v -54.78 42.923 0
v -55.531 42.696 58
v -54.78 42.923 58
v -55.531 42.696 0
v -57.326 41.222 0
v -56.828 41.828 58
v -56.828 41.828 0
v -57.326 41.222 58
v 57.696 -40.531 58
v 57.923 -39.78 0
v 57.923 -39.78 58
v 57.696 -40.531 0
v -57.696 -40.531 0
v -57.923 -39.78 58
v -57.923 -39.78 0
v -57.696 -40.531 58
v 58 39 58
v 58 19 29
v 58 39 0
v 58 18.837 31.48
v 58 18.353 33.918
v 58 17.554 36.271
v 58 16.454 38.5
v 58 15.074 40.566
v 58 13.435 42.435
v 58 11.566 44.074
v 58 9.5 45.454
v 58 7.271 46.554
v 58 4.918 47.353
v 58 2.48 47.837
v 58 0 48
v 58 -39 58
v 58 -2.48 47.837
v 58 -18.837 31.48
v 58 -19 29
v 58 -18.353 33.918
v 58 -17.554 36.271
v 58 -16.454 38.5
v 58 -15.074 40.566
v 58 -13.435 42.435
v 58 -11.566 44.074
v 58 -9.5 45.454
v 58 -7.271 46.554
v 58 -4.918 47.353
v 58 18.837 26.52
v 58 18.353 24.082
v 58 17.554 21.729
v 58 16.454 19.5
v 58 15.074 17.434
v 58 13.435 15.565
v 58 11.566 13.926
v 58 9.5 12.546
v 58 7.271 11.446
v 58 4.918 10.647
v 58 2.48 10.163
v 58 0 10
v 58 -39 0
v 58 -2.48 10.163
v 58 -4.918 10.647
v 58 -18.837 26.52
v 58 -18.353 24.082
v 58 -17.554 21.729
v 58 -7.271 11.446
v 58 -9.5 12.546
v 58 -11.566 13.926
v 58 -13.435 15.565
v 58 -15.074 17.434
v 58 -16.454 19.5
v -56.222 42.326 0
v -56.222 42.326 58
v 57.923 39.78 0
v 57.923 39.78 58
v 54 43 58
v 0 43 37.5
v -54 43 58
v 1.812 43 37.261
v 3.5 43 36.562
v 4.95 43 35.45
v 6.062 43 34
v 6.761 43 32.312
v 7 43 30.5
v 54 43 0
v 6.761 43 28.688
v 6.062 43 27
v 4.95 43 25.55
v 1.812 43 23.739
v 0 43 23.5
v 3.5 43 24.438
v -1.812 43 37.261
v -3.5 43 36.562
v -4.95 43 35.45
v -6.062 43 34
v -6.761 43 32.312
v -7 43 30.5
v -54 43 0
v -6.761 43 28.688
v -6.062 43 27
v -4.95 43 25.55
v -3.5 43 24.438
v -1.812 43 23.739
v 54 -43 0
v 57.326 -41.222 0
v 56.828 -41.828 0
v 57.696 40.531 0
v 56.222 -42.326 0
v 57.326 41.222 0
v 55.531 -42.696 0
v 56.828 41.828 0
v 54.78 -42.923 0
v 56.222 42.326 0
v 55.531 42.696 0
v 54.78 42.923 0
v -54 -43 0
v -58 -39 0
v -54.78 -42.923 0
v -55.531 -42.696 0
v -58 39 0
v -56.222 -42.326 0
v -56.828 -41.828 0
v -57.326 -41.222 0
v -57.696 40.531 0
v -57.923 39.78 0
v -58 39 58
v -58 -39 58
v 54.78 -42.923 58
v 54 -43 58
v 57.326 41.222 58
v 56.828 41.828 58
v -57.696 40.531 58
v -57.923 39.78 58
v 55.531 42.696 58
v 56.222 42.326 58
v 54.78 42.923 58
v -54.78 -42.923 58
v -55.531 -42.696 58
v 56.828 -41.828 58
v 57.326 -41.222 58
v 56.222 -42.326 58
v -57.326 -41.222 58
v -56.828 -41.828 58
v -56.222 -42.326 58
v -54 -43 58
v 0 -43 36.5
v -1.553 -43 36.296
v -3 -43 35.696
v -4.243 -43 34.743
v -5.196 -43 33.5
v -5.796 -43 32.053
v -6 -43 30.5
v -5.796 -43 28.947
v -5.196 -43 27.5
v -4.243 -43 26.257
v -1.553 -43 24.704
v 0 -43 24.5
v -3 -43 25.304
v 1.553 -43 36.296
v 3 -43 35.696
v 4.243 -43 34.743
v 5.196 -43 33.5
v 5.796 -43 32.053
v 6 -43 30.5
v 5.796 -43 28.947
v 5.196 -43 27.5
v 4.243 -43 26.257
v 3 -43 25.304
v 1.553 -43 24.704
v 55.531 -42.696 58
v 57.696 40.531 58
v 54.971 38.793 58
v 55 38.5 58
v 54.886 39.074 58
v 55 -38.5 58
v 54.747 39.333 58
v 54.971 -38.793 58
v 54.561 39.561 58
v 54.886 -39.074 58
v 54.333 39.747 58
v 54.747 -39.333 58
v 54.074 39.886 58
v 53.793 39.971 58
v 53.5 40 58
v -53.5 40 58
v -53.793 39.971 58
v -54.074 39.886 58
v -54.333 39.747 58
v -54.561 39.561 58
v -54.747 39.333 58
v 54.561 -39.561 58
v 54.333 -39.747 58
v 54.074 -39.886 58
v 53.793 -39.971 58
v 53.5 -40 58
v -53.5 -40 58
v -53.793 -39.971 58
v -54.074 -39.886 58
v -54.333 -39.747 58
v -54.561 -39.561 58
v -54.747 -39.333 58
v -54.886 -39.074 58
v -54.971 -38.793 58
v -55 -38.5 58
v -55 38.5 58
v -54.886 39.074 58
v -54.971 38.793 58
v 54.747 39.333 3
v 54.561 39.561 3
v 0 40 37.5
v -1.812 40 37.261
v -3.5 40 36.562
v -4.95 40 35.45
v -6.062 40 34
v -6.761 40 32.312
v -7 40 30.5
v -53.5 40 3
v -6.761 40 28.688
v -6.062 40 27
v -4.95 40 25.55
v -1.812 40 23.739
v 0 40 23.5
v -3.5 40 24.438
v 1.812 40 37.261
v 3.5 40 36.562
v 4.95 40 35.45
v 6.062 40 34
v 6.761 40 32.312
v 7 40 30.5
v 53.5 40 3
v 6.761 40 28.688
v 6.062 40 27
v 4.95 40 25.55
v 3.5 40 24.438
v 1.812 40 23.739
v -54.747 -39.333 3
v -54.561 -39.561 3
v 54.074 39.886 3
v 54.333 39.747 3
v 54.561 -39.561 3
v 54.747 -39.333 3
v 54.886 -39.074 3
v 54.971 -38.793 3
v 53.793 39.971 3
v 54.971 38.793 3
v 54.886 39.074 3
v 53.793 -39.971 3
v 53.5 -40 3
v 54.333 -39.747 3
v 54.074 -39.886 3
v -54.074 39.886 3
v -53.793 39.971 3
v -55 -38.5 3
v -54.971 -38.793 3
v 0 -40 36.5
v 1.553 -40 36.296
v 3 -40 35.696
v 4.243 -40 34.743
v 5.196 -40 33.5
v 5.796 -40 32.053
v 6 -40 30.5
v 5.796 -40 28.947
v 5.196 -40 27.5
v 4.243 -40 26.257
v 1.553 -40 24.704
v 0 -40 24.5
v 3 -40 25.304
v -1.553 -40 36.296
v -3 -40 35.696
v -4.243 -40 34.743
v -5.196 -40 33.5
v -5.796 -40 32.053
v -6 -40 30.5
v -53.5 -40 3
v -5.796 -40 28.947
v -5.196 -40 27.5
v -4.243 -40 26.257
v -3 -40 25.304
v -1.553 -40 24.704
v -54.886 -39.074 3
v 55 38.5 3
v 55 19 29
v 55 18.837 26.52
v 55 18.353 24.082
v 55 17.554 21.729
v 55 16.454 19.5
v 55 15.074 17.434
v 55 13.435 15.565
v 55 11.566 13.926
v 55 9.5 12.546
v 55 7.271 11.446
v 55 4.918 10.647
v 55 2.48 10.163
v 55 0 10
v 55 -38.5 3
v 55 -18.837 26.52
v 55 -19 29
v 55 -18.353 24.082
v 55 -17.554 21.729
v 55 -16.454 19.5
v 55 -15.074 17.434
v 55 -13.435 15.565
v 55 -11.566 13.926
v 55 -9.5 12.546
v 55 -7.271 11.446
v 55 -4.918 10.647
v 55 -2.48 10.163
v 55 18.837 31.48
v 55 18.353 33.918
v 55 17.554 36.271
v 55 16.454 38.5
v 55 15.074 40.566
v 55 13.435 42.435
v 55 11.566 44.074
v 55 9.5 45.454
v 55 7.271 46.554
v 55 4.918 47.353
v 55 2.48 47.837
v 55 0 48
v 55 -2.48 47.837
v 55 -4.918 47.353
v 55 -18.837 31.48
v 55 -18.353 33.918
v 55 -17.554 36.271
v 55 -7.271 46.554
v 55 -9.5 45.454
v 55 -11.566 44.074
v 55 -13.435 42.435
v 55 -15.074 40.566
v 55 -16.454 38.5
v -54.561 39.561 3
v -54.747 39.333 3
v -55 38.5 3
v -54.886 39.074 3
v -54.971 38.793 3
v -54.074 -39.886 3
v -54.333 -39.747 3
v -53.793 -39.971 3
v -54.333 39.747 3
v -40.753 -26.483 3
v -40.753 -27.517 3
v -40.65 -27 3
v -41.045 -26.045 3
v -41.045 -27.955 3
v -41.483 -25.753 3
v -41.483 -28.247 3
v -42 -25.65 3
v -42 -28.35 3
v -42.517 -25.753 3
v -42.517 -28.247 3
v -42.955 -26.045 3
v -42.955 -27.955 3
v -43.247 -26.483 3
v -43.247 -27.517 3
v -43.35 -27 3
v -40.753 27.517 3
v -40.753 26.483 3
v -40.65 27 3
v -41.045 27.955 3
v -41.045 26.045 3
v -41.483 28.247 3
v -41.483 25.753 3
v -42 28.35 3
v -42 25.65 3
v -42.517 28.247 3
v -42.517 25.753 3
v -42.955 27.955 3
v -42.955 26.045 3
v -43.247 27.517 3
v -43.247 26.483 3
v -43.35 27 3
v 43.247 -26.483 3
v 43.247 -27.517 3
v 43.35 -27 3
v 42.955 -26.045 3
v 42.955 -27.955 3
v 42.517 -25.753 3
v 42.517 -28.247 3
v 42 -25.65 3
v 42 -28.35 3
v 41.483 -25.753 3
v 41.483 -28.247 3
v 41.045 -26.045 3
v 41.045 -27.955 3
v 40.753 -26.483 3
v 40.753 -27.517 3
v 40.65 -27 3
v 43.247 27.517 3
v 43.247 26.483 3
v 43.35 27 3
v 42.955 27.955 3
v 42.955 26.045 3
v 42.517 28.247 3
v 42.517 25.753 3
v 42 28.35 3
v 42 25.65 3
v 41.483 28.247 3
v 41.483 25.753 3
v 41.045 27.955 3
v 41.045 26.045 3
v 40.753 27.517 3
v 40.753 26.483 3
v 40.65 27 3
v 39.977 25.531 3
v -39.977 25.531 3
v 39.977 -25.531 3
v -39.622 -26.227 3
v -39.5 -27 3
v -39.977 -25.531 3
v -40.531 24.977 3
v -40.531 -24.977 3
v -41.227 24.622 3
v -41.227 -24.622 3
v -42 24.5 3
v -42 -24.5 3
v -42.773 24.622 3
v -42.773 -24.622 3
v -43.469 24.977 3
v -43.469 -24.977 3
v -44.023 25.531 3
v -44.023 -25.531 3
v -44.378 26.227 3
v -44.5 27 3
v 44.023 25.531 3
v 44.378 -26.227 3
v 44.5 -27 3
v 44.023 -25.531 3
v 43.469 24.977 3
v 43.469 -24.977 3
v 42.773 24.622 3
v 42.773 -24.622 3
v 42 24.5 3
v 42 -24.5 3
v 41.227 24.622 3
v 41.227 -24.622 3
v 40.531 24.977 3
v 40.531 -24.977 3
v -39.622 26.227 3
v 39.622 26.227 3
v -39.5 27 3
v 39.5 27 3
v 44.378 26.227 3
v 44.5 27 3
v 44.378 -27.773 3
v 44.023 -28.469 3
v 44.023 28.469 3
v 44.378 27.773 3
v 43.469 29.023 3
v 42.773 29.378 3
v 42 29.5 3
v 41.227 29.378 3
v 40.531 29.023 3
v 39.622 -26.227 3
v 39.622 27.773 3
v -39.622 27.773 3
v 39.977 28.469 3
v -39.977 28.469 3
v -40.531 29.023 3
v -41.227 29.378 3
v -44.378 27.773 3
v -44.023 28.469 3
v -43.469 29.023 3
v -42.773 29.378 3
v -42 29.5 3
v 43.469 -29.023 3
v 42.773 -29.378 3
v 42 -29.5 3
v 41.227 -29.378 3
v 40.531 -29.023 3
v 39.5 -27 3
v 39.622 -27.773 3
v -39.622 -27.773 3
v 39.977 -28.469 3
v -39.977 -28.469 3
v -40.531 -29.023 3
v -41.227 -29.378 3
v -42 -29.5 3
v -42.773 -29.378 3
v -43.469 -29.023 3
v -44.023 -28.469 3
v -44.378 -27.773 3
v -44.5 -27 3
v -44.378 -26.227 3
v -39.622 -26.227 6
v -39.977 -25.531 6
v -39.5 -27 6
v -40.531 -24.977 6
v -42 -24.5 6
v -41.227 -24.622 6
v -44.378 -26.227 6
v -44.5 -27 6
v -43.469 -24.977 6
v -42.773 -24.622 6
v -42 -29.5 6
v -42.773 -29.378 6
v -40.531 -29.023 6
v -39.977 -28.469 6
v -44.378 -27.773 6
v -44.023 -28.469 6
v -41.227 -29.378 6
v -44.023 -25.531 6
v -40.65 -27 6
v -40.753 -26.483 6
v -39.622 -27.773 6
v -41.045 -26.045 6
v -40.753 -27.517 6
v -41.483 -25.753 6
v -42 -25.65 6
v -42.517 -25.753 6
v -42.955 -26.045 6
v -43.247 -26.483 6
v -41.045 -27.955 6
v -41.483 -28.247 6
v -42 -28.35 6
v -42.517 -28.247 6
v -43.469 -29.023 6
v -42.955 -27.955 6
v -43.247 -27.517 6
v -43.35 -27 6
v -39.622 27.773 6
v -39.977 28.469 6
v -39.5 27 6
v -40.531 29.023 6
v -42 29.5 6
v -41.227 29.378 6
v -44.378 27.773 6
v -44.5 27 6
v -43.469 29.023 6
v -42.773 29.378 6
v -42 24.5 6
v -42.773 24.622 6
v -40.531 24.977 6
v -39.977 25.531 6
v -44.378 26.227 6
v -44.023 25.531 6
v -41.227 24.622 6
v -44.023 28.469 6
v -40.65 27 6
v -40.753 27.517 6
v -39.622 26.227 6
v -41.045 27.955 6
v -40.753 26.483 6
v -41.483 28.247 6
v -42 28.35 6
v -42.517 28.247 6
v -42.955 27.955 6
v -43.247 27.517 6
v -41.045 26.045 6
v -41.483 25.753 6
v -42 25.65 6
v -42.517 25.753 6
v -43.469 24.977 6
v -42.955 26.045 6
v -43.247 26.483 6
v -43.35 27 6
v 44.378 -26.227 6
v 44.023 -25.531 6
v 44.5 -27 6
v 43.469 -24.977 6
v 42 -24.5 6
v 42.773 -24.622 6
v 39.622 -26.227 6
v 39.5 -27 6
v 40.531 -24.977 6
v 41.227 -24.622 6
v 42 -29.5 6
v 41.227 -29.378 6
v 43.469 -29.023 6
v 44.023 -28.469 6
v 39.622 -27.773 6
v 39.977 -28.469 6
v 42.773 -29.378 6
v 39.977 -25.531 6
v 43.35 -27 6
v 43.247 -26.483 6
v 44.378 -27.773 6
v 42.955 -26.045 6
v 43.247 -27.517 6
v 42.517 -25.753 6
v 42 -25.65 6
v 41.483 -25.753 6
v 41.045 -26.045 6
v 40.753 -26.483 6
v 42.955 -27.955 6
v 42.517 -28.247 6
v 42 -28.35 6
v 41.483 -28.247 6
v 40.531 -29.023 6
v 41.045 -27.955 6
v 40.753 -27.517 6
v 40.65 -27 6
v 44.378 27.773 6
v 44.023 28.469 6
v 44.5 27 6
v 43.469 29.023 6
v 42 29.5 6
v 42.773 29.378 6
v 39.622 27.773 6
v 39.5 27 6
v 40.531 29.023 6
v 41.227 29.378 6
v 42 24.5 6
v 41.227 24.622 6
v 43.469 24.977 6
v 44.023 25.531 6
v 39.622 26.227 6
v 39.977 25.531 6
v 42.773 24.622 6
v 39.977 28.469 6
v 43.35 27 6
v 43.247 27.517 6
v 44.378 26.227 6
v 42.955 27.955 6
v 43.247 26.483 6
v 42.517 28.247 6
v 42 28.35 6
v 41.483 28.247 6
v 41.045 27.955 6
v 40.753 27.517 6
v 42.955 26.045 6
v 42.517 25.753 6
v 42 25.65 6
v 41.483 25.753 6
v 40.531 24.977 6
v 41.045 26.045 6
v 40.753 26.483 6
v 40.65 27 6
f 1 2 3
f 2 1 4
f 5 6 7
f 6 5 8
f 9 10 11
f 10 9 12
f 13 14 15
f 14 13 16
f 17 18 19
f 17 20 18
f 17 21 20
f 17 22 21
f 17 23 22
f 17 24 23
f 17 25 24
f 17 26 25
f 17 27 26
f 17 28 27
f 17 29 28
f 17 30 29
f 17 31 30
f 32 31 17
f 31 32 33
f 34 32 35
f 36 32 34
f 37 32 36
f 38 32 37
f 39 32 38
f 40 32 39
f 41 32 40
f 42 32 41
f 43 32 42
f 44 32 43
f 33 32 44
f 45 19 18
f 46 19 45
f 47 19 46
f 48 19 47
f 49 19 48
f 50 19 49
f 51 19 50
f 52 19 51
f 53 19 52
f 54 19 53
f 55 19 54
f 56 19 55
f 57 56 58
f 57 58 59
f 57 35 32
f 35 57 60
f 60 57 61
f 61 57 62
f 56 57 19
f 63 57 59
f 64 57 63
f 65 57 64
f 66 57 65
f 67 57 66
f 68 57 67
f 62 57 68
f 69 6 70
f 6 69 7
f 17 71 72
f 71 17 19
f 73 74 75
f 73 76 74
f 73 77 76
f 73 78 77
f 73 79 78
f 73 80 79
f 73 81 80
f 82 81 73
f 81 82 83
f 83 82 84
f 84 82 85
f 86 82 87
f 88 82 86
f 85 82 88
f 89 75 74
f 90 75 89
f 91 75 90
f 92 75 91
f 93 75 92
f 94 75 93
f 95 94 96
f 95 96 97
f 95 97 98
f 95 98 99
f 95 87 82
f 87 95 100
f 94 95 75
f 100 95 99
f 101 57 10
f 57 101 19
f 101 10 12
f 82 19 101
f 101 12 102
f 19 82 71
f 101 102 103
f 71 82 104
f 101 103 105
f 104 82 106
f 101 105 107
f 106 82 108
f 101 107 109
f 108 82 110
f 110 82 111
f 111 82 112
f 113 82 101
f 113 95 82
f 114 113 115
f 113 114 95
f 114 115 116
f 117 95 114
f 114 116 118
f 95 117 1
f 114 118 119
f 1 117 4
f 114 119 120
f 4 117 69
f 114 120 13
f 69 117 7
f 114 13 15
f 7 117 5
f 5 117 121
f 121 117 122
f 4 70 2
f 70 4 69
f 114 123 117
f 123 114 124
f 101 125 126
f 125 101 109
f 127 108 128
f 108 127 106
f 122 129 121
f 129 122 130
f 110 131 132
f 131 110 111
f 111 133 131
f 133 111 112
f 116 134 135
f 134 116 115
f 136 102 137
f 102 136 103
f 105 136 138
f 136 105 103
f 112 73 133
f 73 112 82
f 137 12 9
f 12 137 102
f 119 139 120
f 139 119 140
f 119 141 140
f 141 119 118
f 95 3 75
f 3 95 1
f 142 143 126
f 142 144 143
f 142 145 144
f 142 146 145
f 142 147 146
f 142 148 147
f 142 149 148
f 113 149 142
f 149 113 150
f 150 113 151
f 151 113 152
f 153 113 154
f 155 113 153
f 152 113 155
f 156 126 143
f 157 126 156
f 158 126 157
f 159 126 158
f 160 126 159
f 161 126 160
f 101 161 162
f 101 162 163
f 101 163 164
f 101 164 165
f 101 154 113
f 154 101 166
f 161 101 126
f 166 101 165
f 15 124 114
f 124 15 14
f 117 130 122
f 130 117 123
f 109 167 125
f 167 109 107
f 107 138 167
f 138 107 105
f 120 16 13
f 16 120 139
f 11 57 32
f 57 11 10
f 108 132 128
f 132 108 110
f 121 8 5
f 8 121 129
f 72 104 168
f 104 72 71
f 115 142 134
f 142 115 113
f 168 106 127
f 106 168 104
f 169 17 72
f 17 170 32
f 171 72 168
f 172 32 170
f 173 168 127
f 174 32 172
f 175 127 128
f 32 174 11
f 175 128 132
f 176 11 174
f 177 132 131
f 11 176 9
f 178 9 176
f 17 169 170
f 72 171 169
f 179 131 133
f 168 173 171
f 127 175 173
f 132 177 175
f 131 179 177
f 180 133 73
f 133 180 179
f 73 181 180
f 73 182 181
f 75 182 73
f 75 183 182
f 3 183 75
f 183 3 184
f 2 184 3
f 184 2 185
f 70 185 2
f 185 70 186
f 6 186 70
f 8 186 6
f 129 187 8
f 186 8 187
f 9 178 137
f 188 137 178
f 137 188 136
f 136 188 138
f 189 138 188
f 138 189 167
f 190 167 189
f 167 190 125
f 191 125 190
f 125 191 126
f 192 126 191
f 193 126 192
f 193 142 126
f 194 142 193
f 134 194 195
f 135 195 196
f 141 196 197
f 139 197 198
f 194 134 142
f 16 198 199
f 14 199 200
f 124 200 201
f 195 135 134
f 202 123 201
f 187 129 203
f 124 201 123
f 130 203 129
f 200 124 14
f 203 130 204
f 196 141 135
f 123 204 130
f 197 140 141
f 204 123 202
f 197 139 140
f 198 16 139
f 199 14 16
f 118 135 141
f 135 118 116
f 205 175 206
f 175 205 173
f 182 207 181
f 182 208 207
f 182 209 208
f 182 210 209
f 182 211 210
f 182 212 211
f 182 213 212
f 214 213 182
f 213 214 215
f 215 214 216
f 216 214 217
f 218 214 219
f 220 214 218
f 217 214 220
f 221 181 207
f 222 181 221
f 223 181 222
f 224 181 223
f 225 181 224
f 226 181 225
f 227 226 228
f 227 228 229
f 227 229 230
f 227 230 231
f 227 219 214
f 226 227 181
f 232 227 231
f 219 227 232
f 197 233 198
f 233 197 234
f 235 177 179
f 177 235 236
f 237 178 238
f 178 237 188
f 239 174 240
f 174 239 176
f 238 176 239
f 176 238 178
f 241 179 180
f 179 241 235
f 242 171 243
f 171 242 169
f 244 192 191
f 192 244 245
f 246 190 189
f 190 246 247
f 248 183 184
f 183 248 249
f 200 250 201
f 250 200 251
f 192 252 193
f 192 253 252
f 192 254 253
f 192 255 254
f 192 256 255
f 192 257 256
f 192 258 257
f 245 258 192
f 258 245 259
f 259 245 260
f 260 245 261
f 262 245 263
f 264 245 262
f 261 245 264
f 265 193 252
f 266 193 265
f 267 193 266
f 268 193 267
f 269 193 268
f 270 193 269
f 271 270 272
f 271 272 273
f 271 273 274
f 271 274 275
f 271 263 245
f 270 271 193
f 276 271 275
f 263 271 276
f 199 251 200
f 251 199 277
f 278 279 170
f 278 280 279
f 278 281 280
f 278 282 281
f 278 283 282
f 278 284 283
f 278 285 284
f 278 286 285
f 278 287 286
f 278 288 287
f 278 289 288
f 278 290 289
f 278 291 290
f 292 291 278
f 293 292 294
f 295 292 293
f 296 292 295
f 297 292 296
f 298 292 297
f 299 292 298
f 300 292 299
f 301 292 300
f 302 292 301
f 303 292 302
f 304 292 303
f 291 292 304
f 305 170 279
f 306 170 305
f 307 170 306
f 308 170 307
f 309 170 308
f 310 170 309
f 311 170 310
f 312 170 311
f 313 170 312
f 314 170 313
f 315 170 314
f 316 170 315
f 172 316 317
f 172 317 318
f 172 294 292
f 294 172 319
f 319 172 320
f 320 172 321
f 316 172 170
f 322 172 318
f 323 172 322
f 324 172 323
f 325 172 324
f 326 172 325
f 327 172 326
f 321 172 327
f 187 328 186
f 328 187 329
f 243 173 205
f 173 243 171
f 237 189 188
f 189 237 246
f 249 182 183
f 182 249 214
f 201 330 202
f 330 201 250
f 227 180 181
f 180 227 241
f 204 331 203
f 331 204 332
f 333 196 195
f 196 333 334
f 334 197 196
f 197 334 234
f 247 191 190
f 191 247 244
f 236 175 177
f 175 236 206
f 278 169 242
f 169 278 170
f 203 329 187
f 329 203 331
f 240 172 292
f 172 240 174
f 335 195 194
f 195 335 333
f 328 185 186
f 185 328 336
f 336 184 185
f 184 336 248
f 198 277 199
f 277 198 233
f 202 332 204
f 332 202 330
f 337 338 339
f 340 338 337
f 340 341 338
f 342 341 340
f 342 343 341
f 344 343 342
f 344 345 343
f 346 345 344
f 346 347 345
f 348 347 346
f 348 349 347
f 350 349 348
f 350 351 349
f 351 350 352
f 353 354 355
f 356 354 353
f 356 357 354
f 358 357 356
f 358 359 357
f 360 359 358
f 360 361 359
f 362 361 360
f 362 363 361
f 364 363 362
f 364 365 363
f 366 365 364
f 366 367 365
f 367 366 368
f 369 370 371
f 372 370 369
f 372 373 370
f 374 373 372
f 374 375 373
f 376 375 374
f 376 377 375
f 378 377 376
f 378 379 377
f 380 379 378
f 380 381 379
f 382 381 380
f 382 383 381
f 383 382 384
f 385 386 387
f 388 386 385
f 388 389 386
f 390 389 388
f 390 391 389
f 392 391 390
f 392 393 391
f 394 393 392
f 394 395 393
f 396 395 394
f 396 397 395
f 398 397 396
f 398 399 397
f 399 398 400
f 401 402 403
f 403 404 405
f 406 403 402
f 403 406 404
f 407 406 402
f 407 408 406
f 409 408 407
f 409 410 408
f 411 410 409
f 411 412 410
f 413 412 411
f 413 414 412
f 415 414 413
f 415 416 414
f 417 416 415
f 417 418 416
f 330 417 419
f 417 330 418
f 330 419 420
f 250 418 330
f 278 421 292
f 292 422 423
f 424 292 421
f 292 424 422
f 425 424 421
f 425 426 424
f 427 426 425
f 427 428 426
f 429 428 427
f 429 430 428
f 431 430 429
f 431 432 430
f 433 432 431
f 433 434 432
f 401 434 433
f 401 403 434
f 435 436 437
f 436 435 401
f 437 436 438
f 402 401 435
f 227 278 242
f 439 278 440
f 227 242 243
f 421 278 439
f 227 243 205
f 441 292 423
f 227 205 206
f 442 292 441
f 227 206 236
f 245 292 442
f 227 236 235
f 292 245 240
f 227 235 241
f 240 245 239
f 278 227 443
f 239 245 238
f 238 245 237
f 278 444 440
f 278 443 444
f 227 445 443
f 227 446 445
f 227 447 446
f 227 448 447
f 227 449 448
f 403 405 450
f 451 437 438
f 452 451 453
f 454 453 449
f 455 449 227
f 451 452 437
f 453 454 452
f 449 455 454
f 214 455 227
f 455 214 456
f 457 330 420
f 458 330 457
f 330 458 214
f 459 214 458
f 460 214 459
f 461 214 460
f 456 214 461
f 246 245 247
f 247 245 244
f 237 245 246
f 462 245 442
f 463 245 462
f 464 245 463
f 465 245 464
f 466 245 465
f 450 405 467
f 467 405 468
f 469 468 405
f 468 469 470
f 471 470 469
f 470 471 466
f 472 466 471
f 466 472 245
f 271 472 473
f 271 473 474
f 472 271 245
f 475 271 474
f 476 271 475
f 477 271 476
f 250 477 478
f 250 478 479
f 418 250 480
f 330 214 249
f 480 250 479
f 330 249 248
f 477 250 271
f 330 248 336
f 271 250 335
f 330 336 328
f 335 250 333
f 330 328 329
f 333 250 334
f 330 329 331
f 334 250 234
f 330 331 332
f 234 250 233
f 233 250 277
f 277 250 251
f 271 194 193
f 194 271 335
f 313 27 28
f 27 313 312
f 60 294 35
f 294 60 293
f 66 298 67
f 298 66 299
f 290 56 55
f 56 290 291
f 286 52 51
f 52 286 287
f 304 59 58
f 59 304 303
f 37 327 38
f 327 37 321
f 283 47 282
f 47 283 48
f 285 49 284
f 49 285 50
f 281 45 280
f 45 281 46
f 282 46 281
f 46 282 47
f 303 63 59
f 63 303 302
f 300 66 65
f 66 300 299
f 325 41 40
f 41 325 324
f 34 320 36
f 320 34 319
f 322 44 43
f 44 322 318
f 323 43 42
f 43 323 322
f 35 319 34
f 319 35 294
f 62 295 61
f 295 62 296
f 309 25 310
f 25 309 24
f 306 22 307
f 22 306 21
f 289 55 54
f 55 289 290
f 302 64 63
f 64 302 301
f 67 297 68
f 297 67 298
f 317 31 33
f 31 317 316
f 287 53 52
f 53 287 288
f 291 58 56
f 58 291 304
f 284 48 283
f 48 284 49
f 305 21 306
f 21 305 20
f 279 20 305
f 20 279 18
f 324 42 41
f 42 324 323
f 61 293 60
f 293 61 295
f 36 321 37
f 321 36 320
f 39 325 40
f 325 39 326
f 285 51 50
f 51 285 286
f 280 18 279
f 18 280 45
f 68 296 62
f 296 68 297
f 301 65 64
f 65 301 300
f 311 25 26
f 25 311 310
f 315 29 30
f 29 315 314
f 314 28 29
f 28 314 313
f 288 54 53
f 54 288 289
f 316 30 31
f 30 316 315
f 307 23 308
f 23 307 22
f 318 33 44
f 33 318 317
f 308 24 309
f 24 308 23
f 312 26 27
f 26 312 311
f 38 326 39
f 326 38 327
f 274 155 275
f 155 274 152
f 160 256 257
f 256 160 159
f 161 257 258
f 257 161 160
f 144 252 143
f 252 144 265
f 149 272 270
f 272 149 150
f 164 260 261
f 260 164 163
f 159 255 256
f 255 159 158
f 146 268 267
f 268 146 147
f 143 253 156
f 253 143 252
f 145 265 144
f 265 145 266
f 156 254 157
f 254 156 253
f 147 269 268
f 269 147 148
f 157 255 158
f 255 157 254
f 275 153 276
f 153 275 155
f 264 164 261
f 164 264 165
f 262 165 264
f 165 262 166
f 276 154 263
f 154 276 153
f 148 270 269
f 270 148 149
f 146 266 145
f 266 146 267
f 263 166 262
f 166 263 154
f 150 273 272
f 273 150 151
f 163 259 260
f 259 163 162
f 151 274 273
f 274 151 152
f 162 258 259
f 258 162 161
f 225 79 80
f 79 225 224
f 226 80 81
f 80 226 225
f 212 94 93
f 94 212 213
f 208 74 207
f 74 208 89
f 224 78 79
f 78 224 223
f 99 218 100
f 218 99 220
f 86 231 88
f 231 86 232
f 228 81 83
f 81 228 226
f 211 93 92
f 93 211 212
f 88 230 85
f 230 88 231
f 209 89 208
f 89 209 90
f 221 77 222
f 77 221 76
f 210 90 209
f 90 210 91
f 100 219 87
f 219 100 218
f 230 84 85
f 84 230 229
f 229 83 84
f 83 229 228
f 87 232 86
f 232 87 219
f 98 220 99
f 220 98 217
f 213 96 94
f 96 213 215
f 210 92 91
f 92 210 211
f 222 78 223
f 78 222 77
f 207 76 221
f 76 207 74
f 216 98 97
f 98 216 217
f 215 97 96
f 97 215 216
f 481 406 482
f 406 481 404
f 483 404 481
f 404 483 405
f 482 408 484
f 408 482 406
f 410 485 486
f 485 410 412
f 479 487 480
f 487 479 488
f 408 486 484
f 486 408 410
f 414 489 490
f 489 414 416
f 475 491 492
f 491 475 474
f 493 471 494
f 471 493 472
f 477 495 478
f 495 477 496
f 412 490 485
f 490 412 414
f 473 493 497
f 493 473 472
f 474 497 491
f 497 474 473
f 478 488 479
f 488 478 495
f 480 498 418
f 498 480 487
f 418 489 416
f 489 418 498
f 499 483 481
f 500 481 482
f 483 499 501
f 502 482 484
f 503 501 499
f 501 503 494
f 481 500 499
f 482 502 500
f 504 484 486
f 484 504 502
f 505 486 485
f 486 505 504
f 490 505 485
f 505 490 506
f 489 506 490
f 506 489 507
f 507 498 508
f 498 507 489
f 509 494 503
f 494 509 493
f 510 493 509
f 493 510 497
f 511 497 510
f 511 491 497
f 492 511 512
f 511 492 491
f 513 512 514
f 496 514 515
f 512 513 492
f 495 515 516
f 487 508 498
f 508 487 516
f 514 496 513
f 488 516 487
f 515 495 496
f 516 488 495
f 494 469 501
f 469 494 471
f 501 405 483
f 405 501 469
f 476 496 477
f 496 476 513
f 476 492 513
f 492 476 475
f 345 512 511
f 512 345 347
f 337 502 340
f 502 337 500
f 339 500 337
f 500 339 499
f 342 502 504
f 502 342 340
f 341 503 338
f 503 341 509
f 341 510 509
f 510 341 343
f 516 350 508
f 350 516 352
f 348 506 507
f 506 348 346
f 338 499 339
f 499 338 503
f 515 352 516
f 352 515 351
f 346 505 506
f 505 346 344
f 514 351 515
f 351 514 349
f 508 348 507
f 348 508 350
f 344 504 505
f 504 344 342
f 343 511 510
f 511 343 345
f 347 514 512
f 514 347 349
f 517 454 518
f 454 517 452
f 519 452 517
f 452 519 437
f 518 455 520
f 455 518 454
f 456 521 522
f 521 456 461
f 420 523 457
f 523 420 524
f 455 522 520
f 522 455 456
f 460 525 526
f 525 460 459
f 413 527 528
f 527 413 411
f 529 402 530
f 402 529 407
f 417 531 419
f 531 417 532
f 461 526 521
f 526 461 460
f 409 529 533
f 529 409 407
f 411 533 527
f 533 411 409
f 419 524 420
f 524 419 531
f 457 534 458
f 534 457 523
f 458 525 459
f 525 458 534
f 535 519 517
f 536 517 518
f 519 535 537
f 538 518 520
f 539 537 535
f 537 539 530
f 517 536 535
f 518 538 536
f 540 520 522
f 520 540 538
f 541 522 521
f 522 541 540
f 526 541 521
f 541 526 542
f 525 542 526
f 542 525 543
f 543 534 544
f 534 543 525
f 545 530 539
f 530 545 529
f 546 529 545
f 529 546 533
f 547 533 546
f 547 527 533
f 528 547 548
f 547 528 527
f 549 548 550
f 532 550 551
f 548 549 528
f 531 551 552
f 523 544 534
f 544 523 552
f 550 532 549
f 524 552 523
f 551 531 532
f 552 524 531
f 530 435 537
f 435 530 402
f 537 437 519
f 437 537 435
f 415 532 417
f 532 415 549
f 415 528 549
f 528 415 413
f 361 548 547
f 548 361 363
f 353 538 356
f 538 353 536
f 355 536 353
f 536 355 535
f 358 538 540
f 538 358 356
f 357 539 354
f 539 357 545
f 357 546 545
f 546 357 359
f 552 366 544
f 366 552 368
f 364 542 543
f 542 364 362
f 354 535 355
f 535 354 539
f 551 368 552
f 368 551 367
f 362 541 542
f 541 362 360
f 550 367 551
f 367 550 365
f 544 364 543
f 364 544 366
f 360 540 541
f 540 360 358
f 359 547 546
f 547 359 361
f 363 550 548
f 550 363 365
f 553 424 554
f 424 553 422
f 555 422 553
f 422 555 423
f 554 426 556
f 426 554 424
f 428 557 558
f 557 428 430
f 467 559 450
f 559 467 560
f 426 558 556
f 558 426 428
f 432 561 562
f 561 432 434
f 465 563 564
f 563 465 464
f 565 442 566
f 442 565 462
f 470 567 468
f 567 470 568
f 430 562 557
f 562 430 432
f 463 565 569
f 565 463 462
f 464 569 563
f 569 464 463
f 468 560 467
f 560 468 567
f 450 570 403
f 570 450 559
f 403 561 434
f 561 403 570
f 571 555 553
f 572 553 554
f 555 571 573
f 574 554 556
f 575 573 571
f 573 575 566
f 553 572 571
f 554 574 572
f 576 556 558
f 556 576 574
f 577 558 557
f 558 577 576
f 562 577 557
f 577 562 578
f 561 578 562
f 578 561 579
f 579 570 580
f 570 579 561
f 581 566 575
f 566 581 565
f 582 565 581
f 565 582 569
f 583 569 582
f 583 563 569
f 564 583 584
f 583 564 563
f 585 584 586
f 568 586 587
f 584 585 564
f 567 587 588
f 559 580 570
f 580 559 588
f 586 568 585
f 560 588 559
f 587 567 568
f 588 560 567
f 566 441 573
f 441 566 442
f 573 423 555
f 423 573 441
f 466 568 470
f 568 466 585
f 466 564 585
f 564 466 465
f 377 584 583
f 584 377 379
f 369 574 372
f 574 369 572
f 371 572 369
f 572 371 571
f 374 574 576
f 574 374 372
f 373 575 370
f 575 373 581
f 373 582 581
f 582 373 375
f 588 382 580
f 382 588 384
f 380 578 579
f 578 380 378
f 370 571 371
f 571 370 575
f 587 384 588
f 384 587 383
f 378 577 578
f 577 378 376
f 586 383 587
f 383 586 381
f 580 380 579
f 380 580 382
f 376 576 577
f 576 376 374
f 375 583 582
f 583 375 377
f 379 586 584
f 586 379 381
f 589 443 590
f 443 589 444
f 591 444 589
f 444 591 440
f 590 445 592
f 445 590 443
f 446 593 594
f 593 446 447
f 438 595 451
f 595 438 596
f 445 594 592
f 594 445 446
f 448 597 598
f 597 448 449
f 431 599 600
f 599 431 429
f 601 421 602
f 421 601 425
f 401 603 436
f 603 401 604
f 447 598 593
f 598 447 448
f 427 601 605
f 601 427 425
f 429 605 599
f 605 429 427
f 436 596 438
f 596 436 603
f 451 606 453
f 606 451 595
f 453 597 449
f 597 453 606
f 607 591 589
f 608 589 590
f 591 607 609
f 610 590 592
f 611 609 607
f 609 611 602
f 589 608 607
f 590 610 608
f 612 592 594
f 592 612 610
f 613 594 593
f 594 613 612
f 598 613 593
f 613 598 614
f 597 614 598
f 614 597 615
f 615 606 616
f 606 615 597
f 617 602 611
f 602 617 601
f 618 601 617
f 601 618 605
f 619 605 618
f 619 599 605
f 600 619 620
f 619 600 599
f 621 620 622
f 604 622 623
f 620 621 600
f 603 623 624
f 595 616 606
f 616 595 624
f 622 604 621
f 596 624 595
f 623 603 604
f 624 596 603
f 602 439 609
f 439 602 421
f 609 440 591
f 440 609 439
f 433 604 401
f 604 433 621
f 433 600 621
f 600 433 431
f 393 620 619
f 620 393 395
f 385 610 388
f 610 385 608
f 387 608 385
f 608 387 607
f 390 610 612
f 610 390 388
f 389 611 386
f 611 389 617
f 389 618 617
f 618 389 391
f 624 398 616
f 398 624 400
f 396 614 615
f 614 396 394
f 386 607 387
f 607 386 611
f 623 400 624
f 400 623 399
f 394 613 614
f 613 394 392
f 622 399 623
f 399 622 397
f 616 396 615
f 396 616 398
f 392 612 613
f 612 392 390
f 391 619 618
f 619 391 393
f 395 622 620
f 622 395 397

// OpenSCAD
/*
 * malcolm_field_enclosure.scad
 * IP65 weatherproof field enclosure for Malcolm GCS comms node
 * (PocketBeagle 2 Industrial + Cape-B-2 + XCVR-49MHZ-2 stack)
 *
 * Author:  Steve Griffing, PE(CSE), CISSP-ISSEP, CPP
 * License: CC BY 4.0 — creativecommons.org/licenses/by/4.0
 * Revision: R (2026-06-11)
 *
 * Description:
 *   Two-part (lid + body) enclosure for Malcolm's comms node.  The interior
 *   fits the PB2-I + Cape-B-2 + XCVR-49MHZ-2 stack on standoffs, a 40 mm
 *   cooling fan, and cable gland locations for RF, USB, power, and servo
 *   feedthroughs.  The lid is retained by M3 screws with a perimeter EPDM
 *   gasket for IP65 ingress protection.
 *
 *   NOTE: This design uses standard off-the-shelf components where possible.
 *   If a commercial Hammond 1590XX or similar IP65 aluminum enclosure fits the
 *   stack, prefer that over a printed enclosure to save weight and print time.
 *   See malcolm_power_budget.md and malcolm_wiring.md for stack dimensions.
 *
 * Stack envelope (Cape-B-2 + PB2-I + XCVR-49MHZ-2):
 *   Footprint: 90 mm × 60 mm
 *   Height:    29 mm (Cape-B-2 PCB 1.6 mm + M2.5×6 standoffs + PB2-I 6 mm board
 *              + M2.5×20 inter-cape standoffs + XCVR 8 mm) ≈ 42 mm total stack
 *   Board clearance below: 3 mm standoff feet
 *   Board clearance above: 8 mm lid clearance
 *   Total interior height needed: 3 + 42 + 8 = 53 mm
 *
 * Mesh verification: run after every geometry change.
 *   openscad -o malcolm_field_enclosure.stl malcolm_field_enclosure.scad
 *   python3 tools/validate_stls.py
 */

/* ---------------------------------------------------------------------------
 * Render mode: 0 = body only, 1 = lid only, 2 = exploded assembly view
 * ---------------------------------------------------------------------------*/
RENDER_MODE = 0;

/* ---------------------------------------------------------------------------
 * Interior dimensions (must fit stack + fan + cable routing)
 * ---------------------------------------------------------------------------*/
INT_W   = 110;      /* Interior width  (X) mm — 90mm stack + 10mm margin each side */
INT_D   = 80;       /* Interior depth  (Y) mm — 60mm stack + 10mm margin each side */
INT_H   = 55;       /* Interior height (Z) mm — see stack height calculation above  */

/* ---------------------------------------------------------------------------
 * Wall and lid geometry
 * ---------------------------------------------------------------------------*/
WALL_T      = 3.0;  /* Wall thickness mm — 3mm PETG adequate for weather seal */
LID_T       = 3.0;  /* Lid panel thickness mm                                  */
GASKET_W    = 4.0;  /* EPDM gasket groove width mm                             */
GASKET_D    = 2.0;  /* EPDM gasket groove depth mm (gasket 3mm dia compresses) */
CORNER_R    = 4.0;  /* Exterior corner radius mm                               */
SCREW_PITCH = 40.0; /* Lid screw pattern — one M3 screw every 40mm along rim   */

/* ---------------------------------------------------------------------------
 * Fan cutout (40 mm axial cooling fan in body wall)
 * ---------------------------------------------------------------------------*/
FAN_SIZE    = 40.0; /* Fan frame size mm (standard 40×40mm fan)                */
FAN_HOLE_D  = 38.0; /* Fan airflow opening diameter mm                         */
FAN_SCREW   = 32.0; /* Fan mounting screw hole pitch mm (32mm for 40mm fan)    */
FAN_SCREW_D = 3.5;  /* Fan mounting screw clearance diameter mm (M3)           */

/* ---------------------------------------------------------------------------
 * Cable gland locations (centred on body walls)
 * Z-position = gland centre height from floor (inside face)
 * ---------------------------------------------------------------------------*/
USB_GLAND_Z     = INT_H / 2;   /* USB-C gland on front wall — mid-height      */
PWR_GLAND_Z     = INT_H / 2;   /* Power XT30 gland on rear wall               */
RF_GLAND_Z      = INT_H * 0.7; /* 5× SMA glands on right wall — upper zone    */
SERVO_GLAND_Z   = INT_H * 0.3; /* Multi-pin servo/I2C connector on left wall  */

/* ---------------------------------------------------------------------------
 * Standoff pattern for Cape-B-2 PCB (90×60mm, M2.5 holes)
 * Origin at floor centre of interior.
 * ---------------------------------------------------------------------------*/
STAND_H     = 3.0;  /* Standoff height off floor mm                           */
STAND_OD    = 5.0;  /* Standoff outer diameter mm                             */
STAND_ID    = 2.7;  /* M2.5 clearance bore mm                                 */
PCB_W       = 90.0; /* Cape-B-2 PCB width mm                                  */
PCB_D       = 60.0; /* Cape-B-2 PCB depth mm                                  */
PCB_MOUNT_X = PCB_W / 2 - 3;   /* PCB mounting hole inset from edge mm        */
PCB_MOUNT_Y = PCB_D / 2 - 3;

/* ============================================================================
 * Derived dimensions
 * ============================================================================*/
EXT_W = INT_W + 2 * WALL_T;    /* Total exterior width  */
EXT_D = INT_D + 2 * WALL_T;    /* Total exterior depth  */
EXT_H = INT_H + WALL_T;        /* Body height (no lid)  */

module rounded_box(w, d, h, r) {
    /*
     * Solid rounded-corner cuboid for exterior shell subtraction.
     * w = width (X), d = depth (Y), h = height (Z), r = corner radius.
     */
    hull() {
        for (xi = [-1, 1]) {
            for (yi = [-1, 1]) {
                translate([xi * (w / 2 - r), yi * (d / 2 - r), 0]) {
                    cylinder(r = r, h = h, $fn = 32);
                }
            }
        }
    }
}

module pcb_standoff(x, y) {
    /*
     * Single M2.5 boss standoff at (x, y) from PCB origin.
     * Standoff is a cylinder with a central clearance bore.
     */
    translate([x, y, 0]) {
        difference() {
            cylinder(d = STAND_OD, h = STAND_H, $fn = 20);
            cylinder(d = STAND_ID, h = STAND_H + 0.1, $fn = 16);
        }
    }
}

module enclosure_body() {
    /*
     * Body (open-top box) with PCB standoffs, fan cutout, and cable gland bosses.
     * Lid seats on the top flange; EPDM gasket groove runs around the perimeter.
     */
    difference() {
        /* --- Exterior solid --- */
        rounded_box(EXT_W, EXT_D, EXT_H, CORNER_R);

        /* --- Interior pocket --- */
        translate([0, 0, WALL_T]) {
            rounded_box(INT_W, INT_D, EXT_H, CORNER_R - WALL_T + 0.5);
        }

        /* --- Fan cutout in +X wall (right side) --- */
        translate([EXT_W / 2, 0, EXT_H / 2]) {
            rotate([0, 90, 0]) {
                cylinder(d = FAN_HOLE_D, h = WALL_T * 2 + 1, center = true, $fn = 48);
            }
        }

        /* --- USB-C gland cutout in -Y wall (front) — placeholder 12mm dia --- */
        translate([0, -EXT_D / 2, USB_GLAND_Z + WALL_T]) {
            rotate([90, 0, 0]) {
                cylinder(d = 12, h = WALL_T * 2 + 1, center = true, $fn = 24);
            }
        }

        /* --- Power gland cutout in +Y wall (rear) — placeholder 14mm dia --- */
        translate([0, EXT_D / 2, PWR_GLAND_Z + WALL_T]) {
            rotate([90, 0, 0]) {
                cylinder(d = 14, h = WALL_T * 2 + 1, center = true, $fn = 24);
            }
        }
    }

    /* --- PCB standoffs on floor --- */
    translate([0, 0, WALL_T]) {
        for (sx = [-PCB_MOUNT_X, PCB_MOUNT_X]) {
            for (sy = [-PCB_MOUNT_Y, PCB_MOUNT_Y]) {
                pcb_standoff(sx, sy);
            }
        }
    }
}

module enclosure_lid() {
    /*
     * Flat lid with perimeter EPDM gasket groove and M3 screw clearance holes.
     * Lid thickness = LID_T; seats on top flange of body.
     */
    difference() {
        /* --- Lid solid --- */
        translate([0, 0, 0]) {
            rounded_box(EXT_W, EXT_D, LID_T, CORNER_R);
        }

        /* --- EPDM gasket groove around perimeter --- */
        difference() {
            rounded_box(EXT_W - WALL_T, EXT_D - WALL_T, GASKET_D + 0.1, CORNER_R - WALL_T / 2);
            rounded_box(EXT_W - WALL_T - 2 * GASKET_W, EXT_D - WALL_T - 2 * GASKET_W,
                        GASKET_D + 0.2, CORNER_R - WALL_T - GASKET_W / 2);
        }
    }
}

/* ============================================================================
 * Render dispatch
 * ============================================================================*/
if (RENDER_MODE == 0) {
    enclosure_body();
} else if (RENDER_MODE == 1) {
    enclosure_lid();
} else {
    /* Exploded assembly view */
    enclosure_body();
    translate([0, 0, EXT_H + 20]) {
        enclosure_lid();
    }
}
